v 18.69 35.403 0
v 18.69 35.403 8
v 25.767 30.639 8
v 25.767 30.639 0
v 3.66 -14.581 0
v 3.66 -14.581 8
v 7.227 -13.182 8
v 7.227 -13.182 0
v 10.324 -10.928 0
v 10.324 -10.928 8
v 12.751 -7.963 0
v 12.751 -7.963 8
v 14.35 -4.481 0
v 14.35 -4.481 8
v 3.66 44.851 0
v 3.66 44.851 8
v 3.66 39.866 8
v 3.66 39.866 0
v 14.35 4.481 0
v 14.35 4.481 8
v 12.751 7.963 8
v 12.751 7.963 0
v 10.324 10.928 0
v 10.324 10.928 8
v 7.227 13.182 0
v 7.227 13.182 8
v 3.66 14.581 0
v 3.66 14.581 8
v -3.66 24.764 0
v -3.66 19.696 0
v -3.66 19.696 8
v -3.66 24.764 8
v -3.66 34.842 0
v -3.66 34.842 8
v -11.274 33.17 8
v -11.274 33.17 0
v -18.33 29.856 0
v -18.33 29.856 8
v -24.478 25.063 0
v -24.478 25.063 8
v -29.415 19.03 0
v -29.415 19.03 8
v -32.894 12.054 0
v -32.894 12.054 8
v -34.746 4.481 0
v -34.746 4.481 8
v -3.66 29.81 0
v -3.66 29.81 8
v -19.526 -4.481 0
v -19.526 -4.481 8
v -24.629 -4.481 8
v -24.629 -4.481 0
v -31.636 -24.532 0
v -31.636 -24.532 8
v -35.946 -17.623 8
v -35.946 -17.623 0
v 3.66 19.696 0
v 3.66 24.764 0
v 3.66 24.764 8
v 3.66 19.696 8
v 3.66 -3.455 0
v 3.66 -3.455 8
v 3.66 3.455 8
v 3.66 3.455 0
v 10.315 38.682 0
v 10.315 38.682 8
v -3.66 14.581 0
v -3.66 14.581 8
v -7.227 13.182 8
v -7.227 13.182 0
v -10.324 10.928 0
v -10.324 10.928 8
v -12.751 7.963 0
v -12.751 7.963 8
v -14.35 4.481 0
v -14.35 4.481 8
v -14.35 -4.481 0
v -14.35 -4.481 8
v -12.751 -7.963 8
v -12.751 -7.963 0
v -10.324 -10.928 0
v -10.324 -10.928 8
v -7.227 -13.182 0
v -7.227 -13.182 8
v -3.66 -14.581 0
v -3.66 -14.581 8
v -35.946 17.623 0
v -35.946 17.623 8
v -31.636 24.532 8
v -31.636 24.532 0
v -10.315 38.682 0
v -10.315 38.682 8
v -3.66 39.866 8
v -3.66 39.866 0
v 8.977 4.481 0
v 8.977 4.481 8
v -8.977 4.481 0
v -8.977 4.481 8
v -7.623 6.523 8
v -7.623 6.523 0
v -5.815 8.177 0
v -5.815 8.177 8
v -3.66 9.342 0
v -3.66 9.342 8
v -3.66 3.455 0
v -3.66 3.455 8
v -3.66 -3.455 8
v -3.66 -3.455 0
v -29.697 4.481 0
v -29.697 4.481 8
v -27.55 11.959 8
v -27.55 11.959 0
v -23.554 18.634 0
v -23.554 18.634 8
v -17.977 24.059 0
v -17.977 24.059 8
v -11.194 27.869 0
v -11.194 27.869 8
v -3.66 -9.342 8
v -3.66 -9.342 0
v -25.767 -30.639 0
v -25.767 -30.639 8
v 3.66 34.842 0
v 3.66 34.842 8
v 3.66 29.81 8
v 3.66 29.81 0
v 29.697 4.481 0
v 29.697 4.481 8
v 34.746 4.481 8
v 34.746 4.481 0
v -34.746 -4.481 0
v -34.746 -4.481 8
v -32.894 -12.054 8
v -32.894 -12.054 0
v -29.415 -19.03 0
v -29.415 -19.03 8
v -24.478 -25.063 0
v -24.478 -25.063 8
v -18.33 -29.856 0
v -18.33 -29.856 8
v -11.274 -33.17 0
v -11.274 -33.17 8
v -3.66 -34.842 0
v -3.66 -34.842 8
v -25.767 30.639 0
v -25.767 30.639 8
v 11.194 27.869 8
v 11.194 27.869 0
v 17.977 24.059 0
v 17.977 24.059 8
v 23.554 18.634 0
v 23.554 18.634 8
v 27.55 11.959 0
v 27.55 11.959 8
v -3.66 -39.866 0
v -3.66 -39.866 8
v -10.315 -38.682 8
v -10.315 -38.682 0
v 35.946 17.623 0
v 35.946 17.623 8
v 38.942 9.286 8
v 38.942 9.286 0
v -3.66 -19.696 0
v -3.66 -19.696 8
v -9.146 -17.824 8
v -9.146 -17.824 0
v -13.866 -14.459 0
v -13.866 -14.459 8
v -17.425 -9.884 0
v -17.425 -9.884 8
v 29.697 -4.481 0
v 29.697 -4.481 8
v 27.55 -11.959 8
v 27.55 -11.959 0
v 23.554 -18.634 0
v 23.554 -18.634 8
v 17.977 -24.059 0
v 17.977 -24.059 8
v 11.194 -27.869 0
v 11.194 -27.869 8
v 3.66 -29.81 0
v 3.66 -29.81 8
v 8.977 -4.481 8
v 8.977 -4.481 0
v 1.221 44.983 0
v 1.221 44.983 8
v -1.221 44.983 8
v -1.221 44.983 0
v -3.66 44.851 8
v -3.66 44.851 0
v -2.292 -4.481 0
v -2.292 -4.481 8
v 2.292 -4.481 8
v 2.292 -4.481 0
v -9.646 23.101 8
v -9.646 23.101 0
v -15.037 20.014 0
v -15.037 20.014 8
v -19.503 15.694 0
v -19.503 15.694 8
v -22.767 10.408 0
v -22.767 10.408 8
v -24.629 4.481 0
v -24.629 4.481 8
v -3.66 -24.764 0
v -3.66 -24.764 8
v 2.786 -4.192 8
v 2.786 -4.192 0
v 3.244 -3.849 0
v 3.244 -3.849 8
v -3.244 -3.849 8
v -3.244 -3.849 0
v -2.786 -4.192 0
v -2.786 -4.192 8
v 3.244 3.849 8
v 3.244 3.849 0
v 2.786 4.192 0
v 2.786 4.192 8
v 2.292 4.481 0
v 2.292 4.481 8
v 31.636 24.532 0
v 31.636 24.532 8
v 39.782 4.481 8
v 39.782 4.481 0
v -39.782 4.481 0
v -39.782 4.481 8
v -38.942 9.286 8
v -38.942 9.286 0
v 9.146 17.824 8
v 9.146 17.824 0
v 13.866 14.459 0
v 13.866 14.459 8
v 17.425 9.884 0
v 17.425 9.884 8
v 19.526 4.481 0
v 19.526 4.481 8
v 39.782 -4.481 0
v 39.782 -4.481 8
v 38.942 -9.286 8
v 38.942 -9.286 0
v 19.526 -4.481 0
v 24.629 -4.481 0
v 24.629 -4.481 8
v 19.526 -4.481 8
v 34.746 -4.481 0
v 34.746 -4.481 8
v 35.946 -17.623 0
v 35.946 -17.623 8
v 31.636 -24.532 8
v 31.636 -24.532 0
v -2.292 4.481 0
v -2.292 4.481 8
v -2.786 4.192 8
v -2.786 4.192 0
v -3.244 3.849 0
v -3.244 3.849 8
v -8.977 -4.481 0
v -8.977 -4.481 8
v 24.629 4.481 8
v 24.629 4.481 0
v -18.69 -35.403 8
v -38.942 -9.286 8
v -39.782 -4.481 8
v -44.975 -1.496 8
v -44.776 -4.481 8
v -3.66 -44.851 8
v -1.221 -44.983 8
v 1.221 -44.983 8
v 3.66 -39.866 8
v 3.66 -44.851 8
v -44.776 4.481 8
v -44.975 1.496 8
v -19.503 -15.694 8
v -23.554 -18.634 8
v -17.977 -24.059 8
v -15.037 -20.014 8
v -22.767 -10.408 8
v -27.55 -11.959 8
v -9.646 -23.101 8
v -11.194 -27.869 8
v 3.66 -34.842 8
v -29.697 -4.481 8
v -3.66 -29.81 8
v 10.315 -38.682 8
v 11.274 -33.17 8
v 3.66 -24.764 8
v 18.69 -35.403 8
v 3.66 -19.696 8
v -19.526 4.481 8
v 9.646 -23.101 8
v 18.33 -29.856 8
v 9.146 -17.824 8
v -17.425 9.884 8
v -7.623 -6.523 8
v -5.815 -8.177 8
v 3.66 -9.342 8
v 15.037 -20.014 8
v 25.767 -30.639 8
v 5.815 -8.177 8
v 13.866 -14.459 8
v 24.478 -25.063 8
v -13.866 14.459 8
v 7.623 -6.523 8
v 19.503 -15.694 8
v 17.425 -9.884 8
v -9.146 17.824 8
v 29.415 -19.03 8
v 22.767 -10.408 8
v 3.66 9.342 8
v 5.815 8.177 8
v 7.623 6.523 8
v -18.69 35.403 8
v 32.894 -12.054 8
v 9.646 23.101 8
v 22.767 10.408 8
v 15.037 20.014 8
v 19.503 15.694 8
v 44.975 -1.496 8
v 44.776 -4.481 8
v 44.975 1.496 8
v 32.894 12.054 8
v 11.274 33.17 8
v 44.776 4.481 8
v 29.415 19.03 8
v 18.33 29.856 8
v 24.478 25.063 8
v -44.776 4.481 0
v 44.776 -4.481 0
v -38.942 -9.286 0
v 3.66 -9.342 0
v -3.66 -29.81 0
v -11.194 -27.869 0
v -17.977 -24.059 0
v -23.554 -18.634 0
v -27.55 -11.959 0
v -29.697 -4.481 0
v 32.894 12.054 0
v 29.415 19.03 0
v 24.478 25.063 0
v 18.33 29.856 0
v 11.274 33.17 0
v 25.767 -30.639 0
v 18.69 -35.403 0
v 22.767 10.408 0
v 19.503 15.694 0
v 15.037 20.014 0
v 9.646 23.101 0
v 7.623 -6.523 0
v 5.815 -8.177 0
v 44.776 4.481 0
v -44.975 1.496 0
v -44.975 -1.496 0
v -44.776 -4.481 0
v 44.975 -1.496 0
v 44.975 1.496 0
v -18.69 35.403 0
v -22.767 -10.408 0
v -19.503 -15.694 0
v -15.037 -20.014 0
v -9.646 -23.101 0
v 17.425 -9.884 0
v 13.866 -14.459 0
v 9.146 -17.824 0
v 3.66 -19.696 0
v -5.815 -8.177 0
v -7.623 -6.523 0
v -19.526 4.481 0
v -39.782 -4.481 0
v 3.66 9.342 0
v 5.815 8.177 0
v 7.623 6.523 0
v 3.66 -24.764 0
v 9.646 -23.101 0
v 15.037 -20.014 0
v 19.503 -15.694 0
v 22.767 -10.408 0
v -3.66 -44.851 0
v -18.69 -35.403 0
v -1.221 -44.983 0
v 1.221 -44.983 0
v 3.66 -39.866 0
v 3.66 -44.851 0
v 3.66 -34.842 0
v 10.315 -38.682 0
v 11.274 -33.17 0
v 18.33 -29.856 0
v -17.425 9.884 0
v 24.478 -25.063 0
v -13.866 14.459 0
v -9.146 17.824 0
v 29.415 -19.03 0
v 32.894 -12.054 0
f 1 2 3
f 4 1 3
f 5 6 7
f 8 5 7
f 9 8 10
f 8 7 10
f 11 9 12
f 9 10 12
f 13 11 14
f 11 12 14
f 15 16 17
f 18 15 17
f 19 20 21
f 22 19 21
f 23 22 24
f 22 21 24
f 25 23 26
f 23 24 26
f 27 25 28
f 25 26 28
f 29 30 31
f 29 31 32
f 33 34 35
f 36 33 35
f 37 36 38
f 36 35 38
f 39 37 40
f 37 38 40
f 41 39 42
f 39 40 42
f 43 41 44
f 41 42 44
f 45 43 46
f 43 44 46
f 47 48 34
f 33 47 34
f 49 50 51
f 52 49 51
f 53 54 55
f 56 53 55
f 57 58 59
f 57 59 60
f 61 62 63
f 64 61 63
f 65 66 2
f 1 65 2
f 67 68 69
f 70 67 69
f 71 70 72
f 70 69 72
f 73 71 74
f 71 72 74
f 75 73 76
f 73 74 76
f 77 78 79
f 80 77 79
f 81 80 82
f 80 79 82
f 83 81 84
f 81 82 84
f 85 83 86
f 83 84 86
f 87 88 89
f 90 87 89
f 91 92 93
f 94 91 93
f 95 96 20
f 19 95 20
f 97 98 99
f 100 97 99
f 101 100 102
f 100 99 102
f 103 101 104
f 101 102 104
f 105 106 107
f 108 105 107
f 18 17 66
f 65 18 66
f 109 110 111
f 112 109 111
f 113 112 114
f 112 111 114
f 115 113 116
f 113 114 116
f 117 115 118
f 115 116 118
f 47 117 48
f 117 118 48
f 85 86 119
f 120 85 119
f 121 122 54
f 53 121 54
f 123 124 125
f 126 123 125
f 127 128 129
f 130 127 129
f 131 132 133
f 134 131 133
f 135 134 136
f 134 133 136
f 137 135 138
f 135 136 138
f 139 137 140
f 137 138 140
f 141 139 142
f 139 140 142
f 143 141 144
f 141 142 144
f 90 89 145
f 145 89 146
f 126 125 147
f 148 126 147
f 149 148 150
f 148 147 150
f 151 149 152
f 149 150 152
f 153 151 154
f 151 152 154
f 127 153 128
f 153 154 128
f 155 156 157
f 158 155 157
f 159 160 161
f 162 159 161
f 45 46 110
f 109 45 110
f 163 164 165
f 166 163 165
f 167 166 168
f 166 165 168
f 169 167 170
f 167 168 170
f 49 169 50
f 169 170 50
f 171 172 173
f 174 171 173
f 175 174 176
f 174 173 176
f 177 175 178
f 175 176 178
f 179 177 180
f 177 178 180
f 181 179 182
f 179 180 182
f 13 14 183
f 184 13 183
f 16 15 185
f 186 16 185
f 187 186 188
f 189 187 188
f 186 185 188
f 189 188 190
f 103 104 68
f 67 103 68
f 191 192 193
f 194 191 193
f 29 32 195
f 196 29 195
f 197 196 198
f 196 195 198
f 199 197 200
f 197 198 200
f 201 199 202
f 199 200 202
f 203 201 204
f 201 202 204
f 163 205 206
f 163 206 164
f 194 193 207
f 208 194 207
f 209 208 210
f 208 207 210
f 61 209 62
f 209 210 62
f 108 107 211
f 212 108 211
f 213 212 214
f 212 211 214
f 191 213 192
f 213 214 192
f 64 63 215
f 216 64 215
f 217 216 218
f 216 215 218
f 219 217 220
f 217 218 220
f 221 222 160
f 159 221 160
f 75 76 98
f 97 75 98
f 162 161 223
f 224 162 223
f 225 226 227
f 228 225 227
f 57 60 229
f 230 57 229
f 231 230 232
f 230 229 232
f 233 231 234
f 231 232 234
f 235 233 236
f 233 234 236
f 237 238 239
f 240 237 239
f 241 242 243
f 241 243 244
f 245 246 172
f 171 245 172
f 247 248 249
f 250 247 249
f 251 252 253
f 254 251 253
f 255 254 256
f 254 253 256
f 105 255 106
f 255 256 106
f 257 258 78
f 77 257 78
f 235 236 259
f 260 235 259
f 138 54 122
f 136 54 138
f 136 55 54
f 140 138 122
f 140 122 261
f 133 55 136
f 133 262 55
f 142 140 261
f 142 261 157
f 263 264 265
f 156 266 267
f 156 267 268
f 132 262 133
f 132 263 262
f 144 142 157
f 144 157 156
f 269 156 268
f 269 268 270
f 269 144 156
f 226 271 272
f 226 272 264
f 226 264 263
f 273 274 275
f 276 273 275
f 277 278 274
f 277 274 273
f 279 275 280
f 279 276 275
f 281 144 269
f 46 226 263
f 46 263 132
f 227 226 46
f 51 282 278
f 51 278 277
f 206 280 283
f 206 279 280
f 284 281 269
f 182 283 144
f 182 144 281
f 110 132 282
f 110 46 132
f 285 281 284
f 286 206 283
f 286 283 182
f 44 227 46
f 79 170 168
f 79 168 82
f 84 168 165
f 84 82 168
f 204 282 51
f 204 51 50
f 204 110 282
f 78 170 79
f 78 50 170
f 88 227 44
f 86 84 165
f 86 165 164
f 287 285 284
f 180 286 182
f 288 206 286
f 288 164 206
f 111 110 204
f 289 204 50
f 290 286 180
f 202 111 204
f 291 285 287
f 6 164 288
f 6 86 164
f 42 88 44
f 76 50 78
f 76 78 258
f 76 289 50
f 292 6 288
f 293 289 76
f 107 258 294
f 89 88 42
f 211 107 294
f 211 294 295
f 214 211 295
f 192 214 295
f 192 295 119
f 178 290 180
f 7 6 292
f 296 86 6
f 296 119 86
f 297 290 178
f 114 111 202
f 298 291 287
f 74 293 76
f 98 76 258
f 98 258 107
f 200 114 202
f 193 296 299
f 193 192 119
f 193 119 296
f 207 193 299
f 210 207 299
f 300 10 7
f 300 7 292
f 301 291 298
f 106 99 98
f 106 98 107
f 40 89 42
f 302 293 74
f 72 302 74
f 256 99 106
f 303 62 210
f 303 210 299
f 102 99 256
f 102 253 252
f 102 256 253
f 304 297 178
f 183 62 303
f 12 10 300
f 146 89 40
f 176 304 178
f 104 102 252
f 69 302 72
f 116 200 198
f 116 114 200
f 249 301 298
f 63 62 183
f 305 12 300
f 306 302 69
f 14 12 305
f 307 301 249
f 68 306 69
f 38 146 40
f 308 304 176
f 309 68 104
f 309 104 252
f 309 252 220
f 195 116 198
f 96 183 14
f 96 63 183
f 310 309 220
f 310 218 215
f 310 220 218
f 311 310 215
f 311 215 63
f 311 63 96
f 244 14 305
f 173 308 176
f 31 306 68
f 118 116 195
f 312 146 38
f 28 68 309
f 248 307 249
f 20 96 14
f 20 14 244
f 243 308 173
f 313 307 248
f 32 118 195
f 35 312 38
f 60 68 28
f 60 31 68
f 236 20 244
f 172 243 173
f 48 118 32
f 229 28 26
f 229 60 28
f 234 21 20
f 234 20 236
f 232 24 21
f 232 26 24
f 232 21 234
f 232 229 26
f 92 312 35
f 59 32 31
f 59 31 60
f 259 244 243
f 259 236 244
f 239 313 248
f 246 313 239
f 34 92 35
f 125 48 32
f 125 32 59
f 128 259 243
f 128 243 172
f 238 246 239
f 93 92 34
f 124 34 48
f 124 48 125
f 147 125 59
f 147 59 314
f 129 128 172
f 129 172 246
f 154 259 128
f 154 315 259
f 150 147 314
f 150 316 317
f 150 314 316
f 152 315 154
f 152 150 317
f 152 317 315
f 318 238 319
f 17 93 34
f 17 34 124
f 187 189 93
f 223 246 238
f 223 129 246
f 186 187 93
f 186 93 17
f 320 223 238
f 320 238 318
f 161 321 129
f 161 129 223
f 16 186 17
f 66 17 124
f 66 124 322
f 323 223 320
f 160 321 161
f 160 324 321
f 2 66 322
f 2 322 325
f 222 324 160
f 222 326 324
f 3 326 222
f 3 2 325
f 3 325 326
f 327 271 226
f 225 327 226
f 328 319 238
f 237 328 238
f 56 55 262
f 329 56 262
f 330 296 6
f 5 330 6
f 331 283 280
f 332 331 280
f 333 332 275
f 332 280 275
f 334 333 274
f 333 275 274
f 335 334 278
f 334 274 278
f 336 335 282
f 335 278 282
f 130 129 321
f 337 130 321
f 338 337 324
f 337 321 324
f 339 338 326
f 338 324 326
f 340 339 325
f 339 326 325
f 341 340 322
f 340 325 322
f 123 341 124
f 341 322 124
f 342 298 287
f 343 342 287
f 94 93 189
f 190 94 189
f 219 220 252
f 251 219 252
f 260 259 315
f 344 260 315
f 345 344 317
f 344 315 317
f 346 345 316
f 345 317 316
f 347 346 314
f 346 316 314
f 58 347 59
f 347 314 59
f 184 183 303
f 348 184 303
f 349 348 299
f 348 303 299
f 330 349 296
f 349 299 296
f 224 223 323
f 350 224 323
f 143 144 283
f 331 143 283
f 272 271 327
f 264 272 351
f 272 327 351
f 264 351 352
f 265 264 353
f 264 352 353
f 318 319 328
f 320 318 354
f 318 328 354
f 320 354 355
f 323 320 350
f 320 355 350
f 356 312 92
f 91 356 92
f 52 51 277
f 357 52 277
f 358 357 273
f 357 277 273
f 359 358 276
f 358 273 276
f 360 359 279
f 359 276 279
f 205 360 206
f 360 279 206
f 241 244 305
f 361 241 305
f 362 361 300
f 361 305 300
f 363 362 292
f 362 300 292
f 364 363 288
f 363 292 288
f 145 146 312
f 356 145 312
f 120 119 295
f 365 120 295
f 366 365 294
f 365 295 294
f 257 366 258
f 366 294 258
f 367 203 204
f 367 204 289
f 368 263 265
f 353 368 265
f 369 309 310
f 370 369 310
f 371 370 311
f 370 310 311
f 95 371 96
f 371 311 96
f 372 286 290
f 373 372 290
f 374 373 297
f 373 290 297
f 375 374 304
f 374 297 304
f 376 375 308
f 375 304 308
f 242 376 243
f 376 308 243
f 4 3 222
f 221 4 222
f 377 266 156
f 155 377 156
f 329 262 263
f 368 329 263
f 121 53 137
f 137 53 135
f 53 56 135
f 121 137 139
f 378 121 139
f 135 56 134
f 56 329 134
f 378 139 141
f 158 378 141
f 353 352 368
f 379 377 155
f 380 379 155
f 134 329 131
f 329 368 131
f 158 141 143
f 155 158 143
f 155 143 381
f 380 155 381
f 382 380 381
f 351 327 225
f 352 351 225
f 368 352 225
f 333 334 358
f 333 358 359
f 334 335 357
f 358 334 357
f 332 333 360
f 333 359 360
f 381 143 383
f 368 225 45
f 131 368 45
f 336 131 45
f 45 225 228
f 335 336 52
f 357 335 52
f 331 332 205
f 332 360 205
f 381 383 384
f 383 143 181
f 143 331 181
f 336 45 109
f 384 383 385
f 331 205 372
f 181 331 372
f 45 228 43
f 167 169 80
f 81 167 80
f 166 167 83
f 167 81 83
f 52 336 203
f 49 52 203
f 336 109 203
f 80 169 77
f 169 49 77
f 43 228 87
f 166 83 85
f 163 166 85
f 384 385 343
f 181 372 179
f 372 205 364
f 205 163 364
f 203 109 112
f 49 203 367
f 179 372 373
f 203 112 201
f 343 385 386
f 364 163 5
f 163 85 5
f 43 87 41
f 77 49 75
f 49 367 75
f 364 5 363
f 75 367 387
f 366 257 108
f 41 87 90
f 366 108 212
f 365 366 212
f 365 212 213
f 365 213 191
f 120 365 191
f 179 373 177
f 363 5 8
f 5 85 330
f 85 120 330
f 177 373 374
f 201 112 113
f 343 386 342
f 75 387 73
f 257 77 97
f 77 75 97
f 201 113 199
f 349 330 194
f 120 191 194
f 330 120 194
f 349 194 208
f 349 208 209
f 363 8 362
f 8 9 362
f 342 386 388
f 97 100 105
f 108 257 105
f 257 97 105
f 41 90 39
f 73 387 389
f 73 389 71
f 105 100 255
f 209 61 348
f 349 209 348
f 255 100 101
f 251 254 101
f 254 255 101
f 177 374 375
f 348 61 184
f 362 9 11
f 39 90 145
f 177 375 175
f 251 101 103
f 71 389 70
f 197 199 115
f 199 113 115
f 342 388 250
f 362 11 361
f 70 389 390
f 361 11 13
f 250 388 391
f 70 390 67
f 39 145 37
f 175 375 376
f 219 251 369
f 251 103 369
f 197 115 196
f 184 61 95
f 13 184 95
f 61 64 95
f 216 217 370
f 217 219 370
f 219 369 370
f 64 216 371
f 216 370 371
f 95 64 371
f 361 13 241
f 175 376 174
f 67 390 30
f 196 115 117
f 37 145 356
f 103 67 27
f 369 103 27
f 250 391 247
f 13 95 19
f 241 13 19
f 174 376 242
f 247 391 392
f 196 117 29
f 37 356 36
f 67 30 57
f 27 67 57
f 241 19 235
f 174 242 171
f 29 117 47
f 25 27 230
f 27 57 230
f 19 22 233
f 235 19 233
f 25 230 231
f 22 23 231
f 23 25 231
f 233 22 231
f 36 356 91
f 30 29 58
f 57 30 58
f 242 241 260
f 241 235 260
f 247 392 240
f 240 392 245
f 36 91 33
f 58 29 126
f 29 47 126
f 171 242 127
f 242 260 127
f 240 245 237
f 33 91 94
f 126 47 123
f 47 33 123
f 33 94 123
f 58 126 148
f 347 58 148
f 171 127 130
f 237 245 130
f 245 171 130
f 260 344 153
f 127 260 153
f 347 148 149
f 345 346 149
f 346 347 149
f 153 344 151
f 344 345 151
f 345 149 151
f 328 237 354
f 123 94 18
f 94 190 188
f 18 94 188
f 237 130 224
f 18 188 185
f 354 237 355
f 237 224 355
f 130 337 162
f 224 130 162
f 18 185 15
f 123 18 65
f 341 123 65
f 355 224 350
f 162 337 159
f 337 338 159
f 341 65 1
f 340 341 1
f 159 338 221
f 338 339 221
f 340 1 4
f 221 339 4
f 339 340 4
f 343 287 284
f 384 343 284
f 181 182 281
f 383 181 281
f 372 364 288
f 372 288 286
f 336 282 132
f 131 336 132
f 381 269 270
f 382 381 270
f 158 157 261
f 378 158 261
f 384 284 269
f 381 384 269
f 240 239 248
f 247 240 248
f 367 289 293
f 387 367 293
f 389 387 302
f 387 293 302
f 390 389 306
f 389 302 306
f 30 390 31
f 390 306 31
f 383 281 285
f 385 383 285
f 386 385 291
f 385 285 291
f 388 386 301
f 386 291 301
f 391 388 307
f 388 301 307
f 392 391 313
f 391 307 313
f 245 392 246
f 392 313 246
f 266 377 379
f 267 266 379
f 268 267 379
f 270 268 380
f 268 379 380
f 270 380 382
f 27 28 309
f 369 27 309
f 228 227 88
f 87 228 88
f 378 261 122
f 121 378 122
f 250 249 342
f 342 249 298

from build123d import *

# Parameters (mm, degrees)
F0_R     = 45
F1_DEPTH = 8
F3_DEPTH = 25
F5_DEPTH = 25


with BuildPart() as f1:
    # F0 (on Top) → F1 (new body)
    with BuildSketch(Plane.XY):
        Circle(F0_R)
    extrude(amount=F1_DEPTH)

    # F2 (on face) → F3 (cut)
    with BuildSketch(Plane.XY.offset(8)):
        with BuildLine():
            ThreePointArc((-44.7762963998, 4.4814373498), (-31.5268148945, 32.1101221207), (-3.659898693, 44.8509213011))
            Line((-3.659898693, 44.8509213011), (-3.659898693, 46.727180481))
            Line((-3.659898693, 46.727180481), (-14.4028495997, 46.727180481))
            Line((-14.4028495997, 46.727180481), (-30.4222777486, 39.8657522048))
            Line((-30.4222777486, 39.8657522048), (-45.7375533879, 26.1307712644))
            Line((-45.7375533879, 26.1307712644), (-50.4905698847, 4.4814373498))
            Line((-50.4905698847, 4.4814373498), (-44.7762963998, 4.4814373498))
        make_face()
        with BuildLine():
            Line((-3.659898693, 39.8657522048), (-3.659898693, 44.8509213011))
            ThreePointArc((-3.659898693, 44.8509213011), (-31.5268148945, 32.1101221207), (-44.7762963998, 4.4814373498))
            Line((-44.7762963998, 4.4814373498), (-39.7817769409, 4.4814373498))
            Line((-39.7817769409, 4.4814373498), (-38.9415013432, 9.2861472328))
            Line((-38.9415013432, 9.2861472328), (-35.9457781326, 17.6231124305))
            Line((-35.9457781326, 17.6231124305), (-31.6359626456, 24.5324056053))
            Line((-31.6359626456, 24.5324056053), (-25.7671181964, 30.6386794289))
            Line((-25.7671181964, 30.6386794289), (-18.6895557962, 35.4030162759))
            Line((-18.6895557962, 35.4030162759), (-10.3150569916, 38.6816837348))
            Line((-10.3150569916, 38.6816837348), (-3.659898693, 39.8657522048))
        make_face()
        with BuildLine():
            ThreePointArc((44.7762963998, 4.4814373498), (31.5268148945, 32.1101221207), (3.659898693, 44.8509213011))
            Line((3.659898693, 44.8509213011), (3.659898693, 39.8657522048))
            Line((3.659898693, 39.8657522048), (10.3150569916, 38.6816837348))
            Line((10.3150569916, 38.6816837348), (18.6895557962, 35.4030162759))
            Line((18.6895557962, 35.4030162759), (25.7671181964, 30.6386794289))
            Line((25.7671181964, 30.6386794289), (31.6359626456, 24.5324056053))
            Line((31.6359626456, 24.5324056053), (35.9457781326, 17.6231124305))
            Line((35.9457781326, 17.6231124305), (38.9415013432, 9.2861472328))
            Line((38.9415013432, 9.2861472328), (39.7817769409, 4.4814373498))
            Line((39.7817769409, 4.4814373498), (44.7762963998, 4.4814373498))
        make_face()
        with BuildLine():
            Line((3.659898693, 46.727180481), (3.659898693, 44.8509213011))
            ThreePointArc((3.659898693, 44.8509213011), (31.5268148945, 32.1101221207), (44.7762963998, 4.4814373498))
            Line((44.7762963998, 4.4814373498), (50.4905698847, 4.4814373498))
            Line((50.4905698847, 4.4814373498), (45.7375533879, 26.1307712644))
            Line((45.7375533879, 26.1307712644), (30.4222777486, 39.8657522048))
            Line((30.4222777486, 39.8657522048), (14.4028495997, 46.727180481))
            Line((14.4028495997, 46.727180481), (3.659898693, 46.727180481))
        make_face()
        with BuildLine():
            ThreePointArc((3.659898693, -44.8509213011), (31.5268148945, -32.1101221207), (44.7762963998, -4.4814373498))
            Line((44.7762963998, -4.4814373498), (39.7817769409, -4.4814373498))
            Line((39.7817769409, -4.4814373498), (38.9415013432, -9.2861472328))
            Line((38.9415013432, -9.2861472328), (35.9457781326, -17.6231124305))
            Line((35.9457781326, -17.6231124305), (31.6359626456, -24.5324056053))
            Line((31.6359626456, -24.5324056053), (25.7671181964, -30.6386794289))
            Line((25.7671181964, -30.6386794289), (18.6895557962, -35.4030162759))
            Line((18.6895557962, -35.4030162759), (10.3150569916, -38.6816837348))
            Line((10.3150569916, -38.6816837348), (3.659898693, -39.8657522048))
            Line((3.659898693, -39.8657522048), (3.659898693, -44.8509213011))
        make_face()
        with BuildLine():
            Line((50.4905698847, -4.4814373498), (44.7762963998, -4.4814373498))
            ThreePointArc((44.7762963998, -4.4814373498), (31.5268148945, -32.1101221207), (3.659898693, -44.8509213011))
            Line((3.659898693, -44.8509213011), (3.659898693, -46.727180481))
            Line((3.659898693, -46.727180481), (14.4028495997, -46.727180481))
            Line((14.4028495997, -46.727180481), (30.4222777486, -39.8657522048))
            Line((30.4222777486, -39.8657522048), (45.7375533879, -26.1307712644))
            Line((45.7375533879, -26.1307712644), (50.4905698847, -4.4814373498))
        make_face()
        with BuildLine():
            Line((-39.7817769409, -4.4814373498), (-44.7762963998, -4.4814373498))
            ThreePointArc((-44.7762963998, -4.4814373498), (-31.5268148945, -32.1101221207), (-3.659898693, -44.8509213011))
            Line((-3.659898693, -44.8509213011), (-3.659898693, -39.8657522048))
            Line((-3.659898693, -39.8657522048), (-10.3150569916, -38.6816837348))
            Line((-10.3150569916, -38.6816837348), (-18.6895557962, -35.4030162759))
            Line((-18.6895557962, -35.4030162759), (-25.7671181964, -30.6386794289))
            Line((-25.7671181964, -30.6386794289), (-31.6359626456, -24.5324056053))
            Line((-31.6359626456, -24.5324056053), (-35.9457781326, -17.6231124305))
            Line((-35.9457781326, -17.6231124305), (-38.9415013432, -9.2861472328))
            Line((-38.9415013432, -9.2861472328), (-39.7817769409, -4.4814373498))
        make_face()
        with BuildLine():
            ThreePointArc((-3.659898693, -44.8509213011), (-31.5268148945, -32.1101221207), (-44.7762963998, -4.4814373498))
            Line((-44.7762963998, -4.4814373498), (-50.4905698847, -4.4814373498))
            Line((-50.4905698847, -4.4814373498), (-45.7375533879, -26.1307712644))
            Line((-45.7375533879, -26.1307712644), (-30.4222777486, -39.8657522048))
            Line((-30.4222777486, -39.8657522048), (-14.4028495997, -46.727180481))
            Line((-14.4028495997, -46.727180481), (-3.659898693, -46.727180481))
            Line((-3.659898693, -46.727180481), (-3.659898693, -44.8509213011))
        make_face()
    extrude(amount=-F3_DEPTH, mode=Mode.SUBTRACT)

    # F4 (on face) → F5 (cut)
    with BuildSketch(Plane.XY.offset(8)):
        with BuildLine():
            ThreePointArc((-34.7455865377, -4.4814373498), (-24.4781891298, -25.0630668813), (-3.659898693, -34.841702113))
            Line((-3.659898693, -34.841702113), (-3.659898693, -29.8095658037))
            ThreePointArc((-3.659898693, -29.8095658037), (-20.9416331367, -21.5279602707), (-29.6971680658, -4.4814373498))
            Line((-29.6971680658, -4.4814373498), (-34.7455865377, -4.4814373498))
        make_face()
        with BuildLine():
            ThreePointArc((-24.6290031955, -4.4814373498), (-17.4044615557, -17.993215307), (-3.659898693, -24.7644144022))
            Line((-3.659898693, -24.7644144022), (-3.659898693, -19.6962490835))
            ThreePointArc((-3.659898693, -19.6962490835), (-13.8659969572, -14.4592950999), (-19.5257216431, -4.4814373498))
            Line((-19.5257216431, -4.4814373498), (-24.6290031955, -4.4814373498))
        make_face()
        with BuildLine():
            ThreePointArc((-14.3499063746, -4.4814373498), (-10.3241960537, -10.9276744793), (-3.659898693, -14.5810917025))
            Line((-3.659898693, -14.5810917025), (-3.659898693, -9.342068428))
            ThreePointArc((-3.659898693, -9.342068428), (-6.769710949, -7.4054111718), (-8.9769605233, -4.4814373498))
            Line((-8.9769605233, -4.4814373498), (-14.3499063746, -4.4814373498))
        make_face()
        with BuildLine():
            Line((3.659898693, -3.4554666532), (3.659898693, 3.4554666532))
            ThreePointArc((3.659898693, 3.4554666532), (3.0196847302, 4.0269855183), (2.2916866091, 4.4814373498))
            Line((2.2916866091, 4.4814373498), (-2.2916866091, 4.4814373498))
            ThreePointArc((-2.2916866091, 4.4814373498), (-3.0196847302, 4.0269855183), (-3.659898693, 3.4554666532))
            Line((-3.659898693, 3.4554666532), (-3.659898693, -3.4554666532))
            ThreePointArc((-3.659898693, -3.4554666532), (-3.0196847302, -4.0269855183), (-2.2916866091, -4.4814373498))
            Line((-2.2916866091, -4.4814373498), (2.2916866091, -4.4814373498))
            ThreePointArc((2.2916866091, -4.4814373498), (3.0196847302, -4.0269855183), (3.659898693, -3.4554666532))
        make_face()
        with BuildLine():
            ThreePointArc((3.659898693, -14.5810917025), (10.3241960537, -10.9276744793), (14.3499063746, -4.4814373498))
            Line((14.3499063746, -4.4814373498), (8.9769605233, -4.4814373498))
            ThreePointArc((8.9769605233, -4.4814373498), (6.769710949, -7.4054111718), (3.659898693, -9.342068428))
            Line((3.659898693, -9.342068428), (3.659898693, -14.5810917025))
        make_face()
        with BuildLine():
            ThreePointArc((3.659898693, -24.7644144022), (17.4044615557, -17.993215307), (24.6290031955, -4.4814373498))
            Line((24.6290031955, -4.4814373498), (19.5257216431, -4.4814373498))
            ThreePointArc((19.5257216431, -4.4814373498), (13.8659969572, -14.4592950999), (3.659898693, -19.6962490835))
            Line((3.659898693, -19.6962490835), (3.659898693, -24.7644144022))
        make_face()
        with BuildLine():
            ThreePointArc((3.659898693, -34.841702113), (24.4781891298, -25.0630668813), (34.7455865377, -4.4814373498))
            Line((34.7455865377, -4.4814373498), (29.6971680658, -4.4814373498))
            ThreePointArc((29.6971680658, -4.4814373498), (20.9416331367, -21.5279602707), (3.659898693, -29.8095658037))
            Line((3.659898693, -29.8095658037), (3.659898693, -34.841702113))
        make_face()
        with BuildLine():
            Line((29.6971680658, 4.4814373498), (34.7455865377, 4.4814373498))
            ThreePointArc((34.7455865377, 4.4814373498), (24.4781891298, 25.0630668813), (3.659898693, 34.841702113))
            Line((3.659898693, 34.841702113), (3.659898693, 29.8095658037))
            ThreePointArc((3.659898693, 29.8095658037), (20.9416331367, 21.5279602707), (29.6971680658, 4.4814373498))
        make_face()
        with BuildLine():
            Line((19.5257216431, 4.4814373498), (24.6290031955, 4.4814373498))
            ThreePointArc((24.6290031955, 4.4814373498), (17.4044615557, 17.993215307), (3.659898693, 24.7644144022))
            Line((3.659898693, 24.7644144022), (3.659898693, 19.6962490835))
            ThreePointArc((3.659898693, 19.6962490835), (13.8659969572, 14.4592950999), (19.5257216431, 4.4814373498))
        make_face()
        with BuildLine():
            Line((8.9769605233, 4.4814373498), (14.3499063746, 4.4814373498))
            ThreePointArc((14.3499063746, 4.4814373498), (10.3241960537, 10.9276744793), (3.659898693, 14.5810917025))
            Line((3.659898693, 14.5810917025), (3.659898693, 9.342068428))
            ThreePointArc((3.659898693, 9.342068428), (6.769710949, 7.4054111718), (8.9769605233, 4.4814373498))
        make_face()
        with BuildLine():
            Line((-3.659898693, 9.342068428), (-3.659898693, 14.5810917025))
            ThreePointArc((-3.659898693, 14.5810917025), (-10.3241960537, 10.9276744793), (-14.3499063746, 4.4814373498))
            Line((-14.3499063746, 4.4814373498), (-8.9769605233, 4.4814373498))
            ThreePointArc((-8.9769605233, 4.4814373498), (-6.769710949, 7.4054111718), (-3.659898693, 9.342068428))
        make_face()
        with BuildLine():
            Line((-3.659898693, 19.6962490835), (-3.659898693, 24.7644144022))
            ThreePointArc((-3.659898693, 24.7644144022), (-17.4044615557, 17.993215307), (-24.6290031955, 4.4814373498))
            Line((-24.6290031955, 4.4814373498), (-19.5257216431, 4.4814373498))
            ThreePointArc((-19.5257216431, 4.4814373498), (-13.8659969572, 14.4592950999), (-3.659898693, 19.6962490835))
        make_face()
        with BuildLine():
            Line((-3.659898693, 29.8095658037), (-3.659898693, 34.841702113))
            ThreePointArc((-3.659898693, 34.841702113), (-24.4781891298, 25.0630668813), (-34.7455865377, 4.4814373498))
            Line((-34.7455865377, 4.4814373498), (-29.6971680658, 4.4814373498))
            ThreePointArc((-29.6971680658, 4.4814373498), (-20.9416331367, 21.5279602707), (-3.659898693, 29.8095658037))
        make_face()
    extrude(amount=-F5_DEPTH, mode=Mode.SUBTRACT)


solid = f1.part
